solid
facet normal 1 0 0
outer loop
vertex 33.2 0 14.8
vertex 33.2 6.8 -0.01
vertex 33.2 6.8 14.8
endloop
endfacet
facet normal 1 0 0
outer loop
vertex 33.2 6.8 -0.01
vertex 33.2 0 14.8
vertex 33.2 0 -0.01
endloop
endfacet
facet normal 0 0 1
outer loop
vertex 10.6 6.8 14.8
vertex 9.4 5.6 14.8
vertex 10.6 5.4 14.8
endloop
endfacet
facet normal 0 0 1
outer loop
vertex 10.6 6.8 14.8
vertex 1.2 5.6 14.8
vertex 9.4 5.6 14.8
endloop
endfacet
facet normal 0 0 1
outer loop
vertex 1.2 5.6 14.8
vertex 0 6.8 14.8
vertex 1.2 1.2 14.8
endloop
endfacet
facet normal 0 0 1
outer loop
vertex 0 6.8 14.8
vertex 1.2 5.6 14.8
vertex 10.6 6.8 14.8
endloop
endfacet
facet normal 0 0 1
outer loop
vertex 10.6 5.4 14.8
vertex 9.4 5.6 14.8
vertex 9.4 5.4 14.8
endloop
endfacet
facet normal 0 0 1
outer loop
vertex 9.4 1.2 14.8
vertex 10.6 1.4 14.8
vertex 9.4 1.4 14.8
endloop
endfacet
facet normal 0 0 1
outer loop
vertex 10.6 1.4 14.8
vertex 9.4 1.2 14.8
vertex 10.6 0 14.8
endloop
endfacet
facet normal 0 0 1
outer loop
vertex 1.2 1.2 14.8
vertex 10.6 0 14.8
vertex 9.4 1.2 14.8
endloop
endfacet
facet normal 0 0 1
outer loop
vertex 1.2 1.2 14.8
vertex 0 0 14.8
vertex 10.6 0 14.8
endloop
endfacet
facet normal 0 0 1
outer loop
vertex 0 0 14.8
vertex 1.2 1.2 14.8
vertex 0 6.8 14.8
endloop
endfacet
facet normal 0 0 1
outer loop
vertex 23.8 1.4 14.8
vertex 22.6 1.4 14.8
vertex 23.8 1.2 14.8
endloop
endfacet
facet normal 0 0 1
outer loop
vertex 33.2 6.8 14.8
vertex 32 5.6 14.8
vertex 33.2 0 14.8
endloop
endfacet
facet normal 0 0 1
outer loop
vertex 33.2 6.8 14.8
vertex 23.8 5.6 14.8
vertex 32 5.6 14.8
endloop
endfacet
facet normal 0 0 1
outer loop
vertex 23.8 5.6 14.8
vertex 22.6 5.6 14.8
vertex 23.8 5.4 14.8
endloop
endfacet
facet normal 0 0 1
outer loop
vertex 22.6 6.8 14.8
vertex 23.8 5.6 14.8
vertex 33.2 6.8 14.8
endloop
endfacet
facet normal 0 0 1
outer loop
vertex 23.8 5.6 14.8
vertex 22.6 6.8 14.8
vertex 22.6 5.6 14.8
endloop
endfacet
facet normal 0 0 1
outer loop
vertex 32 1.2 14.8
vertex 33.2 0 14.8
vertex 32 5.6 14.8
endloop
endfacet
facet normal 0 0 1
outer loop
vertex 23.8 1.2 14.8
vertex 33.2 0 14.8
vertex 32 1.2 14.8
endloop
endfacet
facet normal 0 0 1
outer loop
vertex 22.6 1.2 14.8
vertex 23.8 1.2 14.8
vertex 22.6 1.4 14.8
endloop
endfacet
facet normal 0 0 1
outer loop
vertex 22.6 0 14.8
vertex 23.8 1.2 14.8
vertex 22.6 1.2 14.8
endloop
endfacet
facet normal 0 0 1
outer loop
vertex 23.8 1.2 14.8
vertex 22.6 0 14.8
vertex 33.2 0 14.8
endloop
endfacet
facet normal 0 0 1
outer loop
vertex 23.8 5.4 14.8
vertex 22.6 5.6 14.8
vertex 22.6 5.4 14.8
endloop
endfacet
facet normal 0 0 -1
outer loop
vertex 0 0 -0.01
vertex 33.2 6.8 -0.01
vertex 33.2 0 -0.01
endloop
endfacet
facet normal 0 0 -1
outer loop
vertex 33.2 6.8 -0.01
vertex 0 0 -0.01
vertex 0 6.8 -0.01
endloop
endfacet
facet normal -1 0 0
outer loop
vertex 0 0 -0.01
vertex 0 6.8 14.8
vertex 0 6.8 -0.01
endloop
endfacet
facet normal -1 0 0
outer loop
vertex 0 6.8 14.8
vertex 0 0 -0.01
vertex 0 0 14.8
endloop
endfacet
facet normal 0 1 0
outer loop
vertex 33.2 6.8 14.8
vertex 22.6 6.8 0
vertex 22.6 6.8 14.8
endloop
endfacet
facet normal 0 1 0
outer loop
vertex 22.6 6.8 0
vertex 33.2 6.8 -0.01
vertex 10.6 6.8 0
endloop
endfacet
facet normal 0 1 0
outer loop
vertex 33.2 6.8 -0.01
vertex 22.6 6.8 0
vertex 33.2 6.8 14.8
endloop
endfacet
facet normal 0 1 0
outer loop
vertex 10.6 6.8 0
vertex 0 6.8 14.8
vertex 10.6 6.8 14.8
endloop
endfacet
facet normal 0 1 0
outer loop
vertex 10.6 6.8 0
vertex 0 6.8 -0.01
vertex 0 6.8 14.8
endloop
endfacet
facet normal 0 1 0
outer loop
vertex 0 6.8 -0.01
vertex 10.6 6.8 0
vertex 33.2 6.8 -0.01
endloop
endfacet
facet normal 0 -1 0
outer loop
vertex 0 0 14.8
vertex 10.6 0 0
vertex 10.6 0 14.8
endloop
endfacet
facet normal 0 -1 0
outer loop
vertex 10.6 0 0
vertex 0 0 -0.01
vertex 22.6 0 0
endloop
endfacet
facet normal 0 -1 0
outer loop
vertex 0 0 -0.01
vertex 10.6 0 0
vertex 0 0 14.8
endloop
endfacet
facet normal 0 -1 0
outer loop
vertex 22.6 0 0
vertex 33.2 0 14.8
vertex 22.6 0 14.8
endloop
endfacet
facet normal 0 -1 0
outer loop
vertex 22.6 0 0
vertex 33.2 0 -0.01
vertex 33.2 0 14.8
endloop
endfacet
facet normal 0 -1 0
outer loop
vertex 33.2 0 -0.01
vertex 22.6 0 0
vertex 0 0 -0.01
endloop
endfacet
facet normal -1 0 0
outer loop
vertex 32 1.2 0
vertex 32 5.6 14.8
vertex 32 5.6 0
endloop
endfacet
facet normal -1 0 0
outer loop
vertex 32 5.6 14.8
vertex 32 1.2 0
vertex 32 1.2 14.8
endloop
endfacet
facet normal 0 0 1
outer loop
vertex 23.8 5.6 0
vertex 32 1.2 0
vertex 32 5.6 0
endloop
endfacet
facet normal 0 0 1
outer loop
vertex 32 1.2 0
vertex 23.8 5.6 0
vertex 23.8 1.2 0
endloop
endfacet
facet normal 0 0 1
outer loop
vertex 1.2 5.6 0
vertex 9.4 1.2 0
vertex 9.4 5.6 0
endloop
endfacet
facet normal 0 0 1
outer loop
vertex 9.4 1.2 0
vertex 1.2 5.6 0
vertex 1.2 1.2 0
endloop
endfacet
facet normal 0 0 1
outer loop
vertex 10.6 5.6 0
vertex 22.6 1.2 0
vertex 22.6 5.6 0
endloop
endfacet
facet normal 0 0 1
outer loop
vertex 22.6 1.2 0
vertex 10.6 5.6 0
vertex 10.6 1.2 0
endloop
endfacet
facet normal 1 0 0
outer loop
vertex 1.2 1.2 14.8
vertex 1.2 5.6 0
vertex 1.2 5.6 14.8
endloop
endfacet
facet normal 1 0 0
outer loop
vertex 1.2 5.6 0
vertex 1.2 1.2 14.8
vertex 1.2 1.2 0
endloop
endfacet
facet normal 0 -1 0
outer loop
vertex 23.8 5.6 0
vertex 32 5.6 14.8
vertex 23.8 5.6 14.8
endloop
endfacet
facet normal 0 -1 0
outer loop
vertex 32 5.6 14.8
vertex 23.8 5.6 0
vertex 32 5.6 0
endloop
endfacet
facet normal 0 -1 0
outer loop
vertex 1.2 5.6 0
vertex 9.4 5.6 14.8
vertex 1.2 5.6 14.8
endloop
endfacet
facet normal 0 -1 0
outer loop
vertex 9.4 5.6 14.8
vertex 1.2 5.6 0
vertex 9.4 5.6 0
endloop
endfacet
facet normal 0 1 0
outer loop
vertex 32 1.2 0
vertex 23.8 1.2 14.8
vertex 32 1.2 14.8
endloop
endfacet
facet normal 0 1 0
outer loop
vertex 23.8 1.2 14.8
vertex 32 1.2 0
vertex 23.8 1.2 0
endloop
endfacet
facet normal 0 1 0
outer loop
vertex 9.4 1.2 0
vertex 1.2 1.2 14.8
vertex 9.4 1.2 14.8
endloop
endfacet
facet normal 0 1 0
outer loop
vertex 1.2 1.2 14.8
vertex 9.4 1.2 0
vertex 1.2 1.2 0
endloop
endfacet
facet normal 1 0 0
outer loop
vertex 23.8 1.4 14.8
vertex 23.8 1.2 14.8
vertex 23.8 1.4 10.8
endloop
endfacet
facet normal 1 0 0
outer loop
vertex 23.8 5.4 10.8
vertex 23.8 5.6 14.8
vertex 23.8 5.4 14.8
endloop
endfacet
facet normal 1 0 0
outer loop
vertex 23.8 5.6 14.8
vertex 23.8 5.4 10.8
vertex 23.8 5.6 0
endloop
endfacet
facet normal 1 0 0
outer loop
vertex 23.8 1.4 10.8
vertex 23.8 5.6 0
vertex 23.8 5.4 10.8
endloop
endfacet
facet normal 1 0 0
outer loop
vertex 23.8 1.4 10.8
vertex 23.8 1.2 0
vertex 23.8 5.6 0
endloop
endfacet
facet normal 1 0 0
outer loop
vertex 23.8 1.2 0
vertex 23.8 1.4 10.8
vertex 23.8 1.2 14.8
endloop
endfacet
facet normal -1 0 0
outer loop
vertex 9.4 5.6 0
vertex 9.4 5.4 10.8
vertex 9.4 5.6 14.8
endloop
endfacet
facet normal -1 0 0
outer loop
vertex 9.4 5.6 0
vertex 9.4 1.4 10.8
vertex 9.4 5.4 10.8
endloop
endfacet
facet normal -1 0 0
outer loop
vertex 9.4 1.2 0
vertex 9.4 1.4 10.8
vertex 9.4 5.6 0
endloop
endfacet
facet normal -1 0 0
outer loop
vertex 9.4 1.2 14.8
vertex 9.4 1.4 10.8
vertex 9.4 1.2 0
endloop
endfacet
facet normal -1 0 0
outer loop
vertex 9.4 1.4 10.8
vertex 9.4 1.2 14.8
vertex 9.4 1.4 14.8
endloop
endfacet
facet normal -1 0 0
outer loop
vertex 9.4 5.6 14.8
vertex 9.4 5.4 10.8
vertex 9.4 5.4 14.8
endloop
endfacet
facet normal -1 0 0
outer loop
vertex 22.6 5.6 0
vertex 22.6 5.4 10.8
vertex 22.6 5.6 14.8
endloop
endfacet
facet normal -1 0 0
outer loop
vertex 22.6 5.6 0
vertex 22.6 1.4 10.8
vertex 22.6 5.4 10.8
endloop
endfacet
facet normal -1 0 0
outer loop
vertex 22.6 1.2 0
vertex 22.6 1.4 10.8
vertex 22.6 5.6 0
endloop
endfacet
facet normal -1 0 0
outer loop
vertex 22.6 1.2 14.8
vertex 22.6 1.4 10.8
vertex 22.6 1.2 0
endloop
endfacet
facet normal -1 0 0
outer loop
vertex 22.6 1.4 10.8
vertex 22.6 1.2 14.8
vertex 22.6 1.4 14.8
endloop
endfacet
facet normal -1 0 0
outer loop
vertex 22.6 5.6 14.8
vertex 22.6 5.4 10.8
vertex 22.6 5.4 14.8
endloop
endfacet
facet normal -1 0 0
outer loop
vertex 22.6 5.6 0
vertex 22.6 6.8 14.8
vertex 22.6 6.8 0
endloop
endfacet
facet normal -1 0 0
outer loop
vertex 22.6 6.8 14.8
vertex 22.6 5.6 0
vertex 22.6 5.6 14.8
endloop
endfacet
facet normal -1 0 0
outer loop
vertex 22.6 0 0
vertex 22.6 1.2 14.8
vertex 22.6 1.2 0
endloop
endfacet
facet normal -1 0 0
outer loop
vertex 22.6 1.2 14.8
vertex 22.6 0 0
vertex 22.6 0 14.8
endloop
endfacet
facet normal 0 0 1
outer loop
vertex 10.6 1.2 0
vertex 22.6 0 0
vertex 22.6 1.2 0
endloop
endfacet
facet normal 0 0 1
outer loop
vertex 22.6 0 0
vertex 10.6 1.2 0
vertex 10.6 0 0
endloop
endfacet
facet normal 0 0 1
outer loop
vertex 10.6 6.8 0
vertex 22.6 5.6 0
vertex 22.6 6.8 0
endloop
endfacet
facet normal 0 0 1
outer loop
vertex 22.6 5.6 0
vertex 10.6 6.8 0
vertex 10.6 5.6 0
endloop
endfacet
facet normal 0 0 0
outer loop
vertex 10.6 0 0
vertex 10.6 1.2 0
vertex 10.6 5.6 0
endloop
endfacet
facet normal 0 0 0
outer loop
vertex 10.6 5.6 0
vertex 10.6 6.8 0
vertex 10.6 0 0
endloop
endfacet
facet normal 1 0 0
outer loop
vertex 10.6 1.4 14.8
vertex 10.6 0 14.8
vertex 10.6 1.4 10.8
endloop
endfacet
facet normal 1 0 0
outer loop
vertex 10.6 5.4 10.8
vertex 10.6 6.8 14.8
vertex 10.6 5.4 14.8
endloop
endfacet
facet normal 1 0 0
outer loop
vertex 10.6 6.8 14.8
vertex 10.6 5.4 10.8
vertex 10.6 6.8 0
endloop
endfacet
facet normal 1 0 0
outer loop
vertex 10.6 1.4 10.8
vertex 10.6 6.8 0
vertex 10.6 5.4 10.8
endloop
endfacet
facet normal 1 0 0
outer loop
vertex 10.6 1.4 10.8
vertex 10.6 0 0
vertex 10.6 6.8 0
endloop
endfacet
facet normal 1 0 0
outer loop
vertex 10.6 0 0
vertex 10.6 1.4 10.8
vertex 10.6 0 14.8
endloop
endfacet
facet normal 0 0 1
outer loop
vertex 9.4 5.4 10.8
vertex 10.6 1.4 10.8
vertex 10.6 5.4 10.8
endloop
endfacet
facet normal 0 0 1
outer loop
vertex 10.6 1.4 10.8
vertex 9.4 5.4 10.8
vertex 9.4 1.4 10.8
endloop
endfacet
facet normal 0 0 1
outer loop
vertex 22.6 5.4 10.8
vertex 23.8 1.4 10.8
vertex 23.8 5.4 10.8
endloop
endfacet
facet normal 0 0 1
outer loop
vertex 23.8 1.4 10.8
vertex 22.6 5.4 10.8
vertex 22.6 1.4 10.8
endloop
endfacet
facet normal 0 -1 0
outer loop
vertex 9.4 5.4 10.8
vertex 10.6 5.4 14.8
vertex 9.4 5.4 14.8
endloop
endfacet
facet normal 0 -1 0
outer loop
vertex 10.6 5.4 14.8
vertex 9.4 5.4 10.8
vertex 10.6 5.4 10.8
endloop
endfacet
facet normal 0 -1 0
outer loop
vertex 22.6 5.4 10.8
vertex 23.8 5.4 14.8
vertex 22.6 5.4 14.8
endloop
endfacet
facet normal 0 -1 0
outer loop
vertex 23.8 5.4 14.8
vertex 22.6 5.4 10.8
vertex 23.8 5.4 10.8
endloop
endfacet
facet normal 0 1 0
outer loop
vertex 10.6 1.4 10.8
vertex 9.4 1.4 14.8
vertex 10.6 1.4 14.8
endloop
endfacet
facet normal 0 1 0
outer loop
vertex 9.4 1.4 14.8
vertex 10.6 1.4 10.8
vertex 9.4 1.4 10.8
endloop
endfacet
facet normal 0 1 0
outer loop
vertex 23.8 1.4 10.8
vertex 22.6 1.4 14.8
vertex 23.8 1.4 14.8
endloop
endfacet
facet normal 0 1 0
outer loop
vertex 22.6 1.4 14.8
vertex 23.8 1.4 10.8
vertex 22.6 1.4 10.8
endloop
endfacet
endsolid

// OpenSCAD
// file: ../Base/Boxes.scad
// Fischertechnik Box Foundation
// Pre-designed Boxes

use <Constants.scad>

include <PlacementOptions.scad>

box190Width = 190;
box190Depth = 130;
box130Width = 130;
box130Depth = 95;
boxUsageHeight = 33.9;
boxWallThickness = 2.4;
boxBaseThickness = 1.0;
boxWebWidth = 3.0;

// getBoxWallThickness()
// Gets the wall thickness of a Fischertechnik Box

function getBoxWallThickness() = boxWallThickness;

// Gets the usable height of a fischertechnik box
function getBoxUsageHeight() = boxUsageHeight;

// Gets the thickness of the Fischertechnik box base.
function getBoxBaseThickness() = boxBaseThickness;

// Gets the width of a box web
function getBoxWebWidth() = boxWebWidth;

// Gets the usable inner space of a Box 190 as an x/y-list
function getBox190Space() = [
    box190Width - 2*getBoxWallThickness(), 
    box190Depth - 2*getBoxWallThickness() ];

// Imports the Fischertechnik empty box 130x190 mm and places it at position 0,0
// 190x130 are the outer sizes, the inner space is slightly smaller. Use getBox190Space() to get the inner sizes.
// This module needs the STL file "Fischertechnik Box 130x190.stl" in the library path.
// The box is positioned that the usable inner space is at the 0,0,0 position. The

module Box190() {
    translate([-getBoxWallThickness(),-getBoxWallThickness(),-getBoxBaseThickness()])
        import("Fischertechnik Box 130x190.stl", convexity=3);
}

// Gets the usable inner space of a Box 130 as an x/y-list
function getBox130Space() = [
    box130Width - 2*getBoxWallThickness(), 
    box130Depth - 2*getBoxWallThickness() ];

// Imports the Fischertechnik empty box 95x130 mm and places it at position 0,0
// 190x130 are the outer sizes, the inner space is slightly smaller. Use getBox190Space() to get the inner sizes.
// This module needs the STL file "Fischertechnik Box 95x130.stl" in the library path.
// The box is positioned that the usable inner space is at the 0,0,0 position. The

module Box130() {
    translate([-getBoxWallThickness(),-getBoxWallThickness(),-getBoxBaseThickness()])
        import("Fischertechnik Box 95x130.stl", convexity=3);
}

// Creates a web at the specified box walls
// corner 0 = LowerLeft, 1 = UpperLeft, 2 = UpperRight, 3 = LowerRight
// side 0 = LeftOfCorner, 1 = RightOfCorner
// distance = Distance in mm from the corner
// box = inner width and depth of the box (default: Box 190)
// webWidth = length of the web (default is 3 mms)
// webThickness = thickness of the web (default is 1 mm)

module BoxWeb(corner, side, distance, box=getBox190Space(), webWidth=getBoxWebWidth(), webThickness=1.0) {
    sink = getBoxWallThickness()/2;

    width = (corner % 2 == 0) ? 
            (side == LeftOfCorner ? webWidth : webThickness) :
            (side == LeftOfCorner ? webThickness : webWidth);

    depth = (corner % 2 == 0) ? 
            (side == RightOfCorner ? webWidth : webThickness) :
            (side == RightOfCorner ? webThickness : webWidth);
    
    xDiff = corner == LowerLeft ? 
                (side == LeftOfCorner ? -sink : distance) :
            (corner == UpperLeft ?                
                (side == LeftOfCorner ? distance : -sink) :
            (corner == UpperRight ?
                (side == LeftOfCorner ? box.x-webWidth+sink : box.x-distance-webThickness) :
                (side == LeftOfCorner ? box.x-distance-webThickness: box.x-webWidth+sink)));

    yDiff = corner == LowerLeft ? 
                (side == RightOfCorner ? -sink : distance) :
            (corner == UpperLeft ?
                (side == RightOfCorner ? box.y-distance : box.y-webWidth+sink) :
            (corner == UpperRight ?
                (side == RightOfCorner ? box.y-webWidth+sink : box.y-distance) :
                (side == RightOfCorner ? distance : -sink)));
    
    translate([xDiff, yDiff, -getExcess()])
        cube([width, depth, boxUsageHeight + 2*getExcess()]);
}
// file: ../Base/Rotation.scad
// Fischertechnik Box Foundation
// Geometry Helpers Rotation

include <PlacementOptions.scad>

// getRotatedSpace(space, rotation=NoRotation)
// Rotates the space dependent on the specified rotation

function getRotatedSpace(space, rotation=NoRotation) = [
    (rotation == Rotate90 || rotation == Rotate270) ? space.y : space.x,
    (rotation == Rotate90 || rotation == Rotate270) ? space.x : space.y
];

// Rotates the given space around the fixed left lower corner
// space = the space the children needs as width/depth list [width,depth]
// rotation = 0 Rotate0 degrees, 1 Rotate90 degrees, 2 Rotate180 degrees, 3 Rotate270 degrees (equivalent to -90)

module RotateFix(space, rotation=Rotate0) {
    dy = (rotation == Rotate0 || rotation == Rotate270) ? 0 :
        (rotation == Rotate90) ? space.x :
        space.y;
    dx = (rotation < Rotate180) ? 0 :
        (rotation == Rotate180) ? space.x :
        space.y;
    
    translate([dx, dy, 0])
        rotate([0, 0, rotations[rotation]])
            children();
}
// file: ../Base/Alignment.scad
// Fischertechnik Box Foundation
// Geometry Helpers Alignment

include <PlacementOptions.scad>

// getAlignedX(elementWidth, spaceWidth, align=AlignRight, offset=0)
// Gets the aligned X offset of an element with the given
// width in the given space.
// elementWidth = The width of the element to positon
// spaceWidth = The space where the element should be aligned
// align = 0 AlignLeft, 1 AlignCenter, 2 AlignRight
// offset = an optional offset from the aligned position. When
// aligned left or centered, then positive values are in X direction.
// When aligned right then positive values are in negative X direction.

function getAlignedX(elementWidth, spaceWidth, align=AlignRight, offset=0) =
    (align == AlignLeft) ?
        offset :
        ((align == AlignCenter) ?
        (spaceWidth - elementWidth)/2 + offset :
        spaceWidth - offset - elementWidth);

// getAlignedY(elementDepth, spaceDepth, align=AlignTop, offset=0)
// Gets the aligned Y offset of an element with the given
// depth in the given space.
// elementDepth = The depth of the element to positon
// spaceDepth = The space where the element should be aligned
// align = 0 AlignBottom, 1 AlignCenter, 2 AlignTop
// offset = an optional offset from the aligned position. When
// aligned bottom or centered, then positive values are in Y direction.
// When aligned top then positive values are in negative Y direction.

function getAlignedY(elementDepth, spaceDepth, align=AlignTop, offset=0) =
    (align == AlignBottom) ?
        offset :
        ((align == AlignCenter) ?
        (spaceDepth - elementDepth)/2 + offset :
        spaceDepth - offset - elementDepth);
// file: ../Base/PlacementOptions.scad
// Fischertechnik Box Foundation
// Placement Options

// Alignment
NoAlign = 0;
AlignLeft = 1;
AlignBottom = 2;
AlignCenter = 3;
AlignRight = 4;
AlignTop = 5;

// Element rotation degree steps
rotations = [0, -90, -180, -270];

// Rotation
NoRotation = 0;
Rotate0 = 0;
Rotate90 = 1;
Rotate180 = 2;
Rotate270 = 3;

// Docking (seen from above)
NoDock = -1;
DockLeft = 0;
DockTop = 1;
DockRight = 2;
DockCorner = 2;
DockBottom = 3;

// Web corners
LowerLeft = 0;
UpperLeft = 1;
UpperRight = 2;
LowerRight = 3;

// Web position relative to corner
LeftOfCorner = 0;
RightOfCorner = 1;
// file: ../Base/Placement.scad
// Fischertechnik Box Foundation
// Geometry Helpers Placement

use <Constants.scad>
use <Alignment.scad>
use <Rotation.scad>
use <Boxes.scad>

include <PlacementOptions.scad>

// Place(x=0, y=0, elementSpace=[0,0], alignX=AlignLeft, alignY=AlignBottom, rotation=Rotate0, boxSpace=getBox190Space())
// Places the child at the specified position
// y = Y-Position. This is a relative position when an X aligment is specified.
// x = X-Position. This is a relative position when an Y aligment is specified.
// elementSpace = space of the element to be placed [x,y]
// alignX = -1=NoAlign, 0 AlignLeft, 1 AlignCenter, 3 AlignRight (elementSpace and boxSpace required!)
// alignY = -1=NoAlign, 2 AlignBottom, 1 AlignCenter, 4 AlignTop (elementSpace and boxSpace required!)
// rotation = 0 Rotate0 0 degrees, 1 Rotate90 90 degrees, 
// 2 Rotate180 180 degrees, 3 Rotate270 270 degrees (equivalent to -90)
// boxSpace = Inner space of the box where the placement occurs [x,y] - default is Box 190x130 inner space

module Place(x=0, y=0, elementSpace=[0,0], 
  alignX=AlignLeft, alignY=AlignBottom, 
  rotation=NoRotation, boxSpace=getBox190Space()) {

    module Position(x, y, space, rotation=Rotate0) {
        translate([x, y, 0])
            RotateFix(space, rotation)
                children();
    }

    space = getRotatedSpace(elementSpace, rotation);
    alignedX = getAlignedX(space.x, boxSpace.x, alignX, x);
    alignedY = getAlignedY(space.y, boxSpace.y, alignY, y);
    Position(alignedX, alignedY, elementSpace, rotation)
        children();
}

// Center(space=getBox130Space(), elementSpace=[0,0])
// space = Space where the children is centered. For cylinder use centered=true and no elementSpace.
// elementSpace = space of the element to be centered [x,y]

module Center(space=getBox190Space(), elementSpace=[0,0]) {
    translate([(space.x - elementSpace.x) / 2, (space.y - elementSpace.y) / 2])
        children(0);
}

// CenterHorizontal(width=0, y=0, offset=0, space=getBox130Space())
// space = Space where the children is centered. For cylinder use centered=true and no elementSpace.
// elementSpace = space of the element to be centered [x,y]

module CenterHorizontal(width=0, y=0, offset=0, space=getBox190Space()) {
    translate([(space.x - width) / 2 + offset, y])
        children(0);
}

// CenterVertical(depth=0, x=0, offset=0, space=getBox130Space())
// space = Space where the children is centered. For cylinder use centered=true and no elementSpace.
// elementSpace = space of the element to be centered [x,y]

module CenterVertical(depth=0, x=0, offset=0, space=getBox190Space()) {
    translate([x, (space.y - depth) / 2 + offset])
        children(0);
}
// file: ../Base/Constants.scad
// Fischertechnik Box Foundation
// Constants

// Constant values necessary for multiple elements

// Base constants
dividerThickness = 1.2;
excess = 0.01;
fragments = 90;
tolerance = 0.8;

// Gets the thickness of a divider 
function getDividerThickness() = dividerThickness;

// Gets the excess that is used to merge walls into each other
function getExcess() = excess;

// Gets amount of fragments of a cylinder
function getFragments() = fragments;

// Gets the inner tolerance of a frame to each side
function getTolerance() = tolerance;


// Fischertechnik specific constants
axisDiameter = 4;
axisBottomDiameter = axisDiameter + 1;
standardEdgeDistance = 2.5;
standardWebDistance = 11.5;
standardCornerLength = 15;
tubeWallFactor = 0.8;

// Gets axis diameter
function getAxisDiameter() = axisDiameter;

// Gets axis bottom diameter for thicker part at the bottom
function getAxisBottomDiameter() = axisBottomDiameter;

// gets the standard distance to the wall of the box for dockable frames with webs
function getStandardEdgeDistance() = standardEdgeDistance;

// gets the standard distance of each web to the corner of the dockable frame
function getStandardWebDistance() = standardWebDistance;

// gets the standard length of the corner walls of a dockable frame
function getStandardCornerLength() = standardCornerLength;

// gets the wall thickness of a tube.
function getTubeWallThickness() = tubeWallFactor * getDividerThickness();
// main file
// Fischertechnik Box Library
// Frame for single 30 mm Axis
// 31034
// For standing axis see CylinderAxis30

use <../Base/Constants.scad>
use <../ModelBase/Complex.scad>

length = 30;

// getFrameAxis30Space()
// Gets the width (.x) and depth (.y) of the axis frame.

function getFrameAxis30Space() = getFrameAxisSpace(length);

// FrameAxis30()
// Axis holder for a single 30 mm axis.
// For standing axis see CylinderAxis30

module FrameAxis30() {
    FrameAxis(length);
}

// Test
color("lightgray")
FrameAxis30();
